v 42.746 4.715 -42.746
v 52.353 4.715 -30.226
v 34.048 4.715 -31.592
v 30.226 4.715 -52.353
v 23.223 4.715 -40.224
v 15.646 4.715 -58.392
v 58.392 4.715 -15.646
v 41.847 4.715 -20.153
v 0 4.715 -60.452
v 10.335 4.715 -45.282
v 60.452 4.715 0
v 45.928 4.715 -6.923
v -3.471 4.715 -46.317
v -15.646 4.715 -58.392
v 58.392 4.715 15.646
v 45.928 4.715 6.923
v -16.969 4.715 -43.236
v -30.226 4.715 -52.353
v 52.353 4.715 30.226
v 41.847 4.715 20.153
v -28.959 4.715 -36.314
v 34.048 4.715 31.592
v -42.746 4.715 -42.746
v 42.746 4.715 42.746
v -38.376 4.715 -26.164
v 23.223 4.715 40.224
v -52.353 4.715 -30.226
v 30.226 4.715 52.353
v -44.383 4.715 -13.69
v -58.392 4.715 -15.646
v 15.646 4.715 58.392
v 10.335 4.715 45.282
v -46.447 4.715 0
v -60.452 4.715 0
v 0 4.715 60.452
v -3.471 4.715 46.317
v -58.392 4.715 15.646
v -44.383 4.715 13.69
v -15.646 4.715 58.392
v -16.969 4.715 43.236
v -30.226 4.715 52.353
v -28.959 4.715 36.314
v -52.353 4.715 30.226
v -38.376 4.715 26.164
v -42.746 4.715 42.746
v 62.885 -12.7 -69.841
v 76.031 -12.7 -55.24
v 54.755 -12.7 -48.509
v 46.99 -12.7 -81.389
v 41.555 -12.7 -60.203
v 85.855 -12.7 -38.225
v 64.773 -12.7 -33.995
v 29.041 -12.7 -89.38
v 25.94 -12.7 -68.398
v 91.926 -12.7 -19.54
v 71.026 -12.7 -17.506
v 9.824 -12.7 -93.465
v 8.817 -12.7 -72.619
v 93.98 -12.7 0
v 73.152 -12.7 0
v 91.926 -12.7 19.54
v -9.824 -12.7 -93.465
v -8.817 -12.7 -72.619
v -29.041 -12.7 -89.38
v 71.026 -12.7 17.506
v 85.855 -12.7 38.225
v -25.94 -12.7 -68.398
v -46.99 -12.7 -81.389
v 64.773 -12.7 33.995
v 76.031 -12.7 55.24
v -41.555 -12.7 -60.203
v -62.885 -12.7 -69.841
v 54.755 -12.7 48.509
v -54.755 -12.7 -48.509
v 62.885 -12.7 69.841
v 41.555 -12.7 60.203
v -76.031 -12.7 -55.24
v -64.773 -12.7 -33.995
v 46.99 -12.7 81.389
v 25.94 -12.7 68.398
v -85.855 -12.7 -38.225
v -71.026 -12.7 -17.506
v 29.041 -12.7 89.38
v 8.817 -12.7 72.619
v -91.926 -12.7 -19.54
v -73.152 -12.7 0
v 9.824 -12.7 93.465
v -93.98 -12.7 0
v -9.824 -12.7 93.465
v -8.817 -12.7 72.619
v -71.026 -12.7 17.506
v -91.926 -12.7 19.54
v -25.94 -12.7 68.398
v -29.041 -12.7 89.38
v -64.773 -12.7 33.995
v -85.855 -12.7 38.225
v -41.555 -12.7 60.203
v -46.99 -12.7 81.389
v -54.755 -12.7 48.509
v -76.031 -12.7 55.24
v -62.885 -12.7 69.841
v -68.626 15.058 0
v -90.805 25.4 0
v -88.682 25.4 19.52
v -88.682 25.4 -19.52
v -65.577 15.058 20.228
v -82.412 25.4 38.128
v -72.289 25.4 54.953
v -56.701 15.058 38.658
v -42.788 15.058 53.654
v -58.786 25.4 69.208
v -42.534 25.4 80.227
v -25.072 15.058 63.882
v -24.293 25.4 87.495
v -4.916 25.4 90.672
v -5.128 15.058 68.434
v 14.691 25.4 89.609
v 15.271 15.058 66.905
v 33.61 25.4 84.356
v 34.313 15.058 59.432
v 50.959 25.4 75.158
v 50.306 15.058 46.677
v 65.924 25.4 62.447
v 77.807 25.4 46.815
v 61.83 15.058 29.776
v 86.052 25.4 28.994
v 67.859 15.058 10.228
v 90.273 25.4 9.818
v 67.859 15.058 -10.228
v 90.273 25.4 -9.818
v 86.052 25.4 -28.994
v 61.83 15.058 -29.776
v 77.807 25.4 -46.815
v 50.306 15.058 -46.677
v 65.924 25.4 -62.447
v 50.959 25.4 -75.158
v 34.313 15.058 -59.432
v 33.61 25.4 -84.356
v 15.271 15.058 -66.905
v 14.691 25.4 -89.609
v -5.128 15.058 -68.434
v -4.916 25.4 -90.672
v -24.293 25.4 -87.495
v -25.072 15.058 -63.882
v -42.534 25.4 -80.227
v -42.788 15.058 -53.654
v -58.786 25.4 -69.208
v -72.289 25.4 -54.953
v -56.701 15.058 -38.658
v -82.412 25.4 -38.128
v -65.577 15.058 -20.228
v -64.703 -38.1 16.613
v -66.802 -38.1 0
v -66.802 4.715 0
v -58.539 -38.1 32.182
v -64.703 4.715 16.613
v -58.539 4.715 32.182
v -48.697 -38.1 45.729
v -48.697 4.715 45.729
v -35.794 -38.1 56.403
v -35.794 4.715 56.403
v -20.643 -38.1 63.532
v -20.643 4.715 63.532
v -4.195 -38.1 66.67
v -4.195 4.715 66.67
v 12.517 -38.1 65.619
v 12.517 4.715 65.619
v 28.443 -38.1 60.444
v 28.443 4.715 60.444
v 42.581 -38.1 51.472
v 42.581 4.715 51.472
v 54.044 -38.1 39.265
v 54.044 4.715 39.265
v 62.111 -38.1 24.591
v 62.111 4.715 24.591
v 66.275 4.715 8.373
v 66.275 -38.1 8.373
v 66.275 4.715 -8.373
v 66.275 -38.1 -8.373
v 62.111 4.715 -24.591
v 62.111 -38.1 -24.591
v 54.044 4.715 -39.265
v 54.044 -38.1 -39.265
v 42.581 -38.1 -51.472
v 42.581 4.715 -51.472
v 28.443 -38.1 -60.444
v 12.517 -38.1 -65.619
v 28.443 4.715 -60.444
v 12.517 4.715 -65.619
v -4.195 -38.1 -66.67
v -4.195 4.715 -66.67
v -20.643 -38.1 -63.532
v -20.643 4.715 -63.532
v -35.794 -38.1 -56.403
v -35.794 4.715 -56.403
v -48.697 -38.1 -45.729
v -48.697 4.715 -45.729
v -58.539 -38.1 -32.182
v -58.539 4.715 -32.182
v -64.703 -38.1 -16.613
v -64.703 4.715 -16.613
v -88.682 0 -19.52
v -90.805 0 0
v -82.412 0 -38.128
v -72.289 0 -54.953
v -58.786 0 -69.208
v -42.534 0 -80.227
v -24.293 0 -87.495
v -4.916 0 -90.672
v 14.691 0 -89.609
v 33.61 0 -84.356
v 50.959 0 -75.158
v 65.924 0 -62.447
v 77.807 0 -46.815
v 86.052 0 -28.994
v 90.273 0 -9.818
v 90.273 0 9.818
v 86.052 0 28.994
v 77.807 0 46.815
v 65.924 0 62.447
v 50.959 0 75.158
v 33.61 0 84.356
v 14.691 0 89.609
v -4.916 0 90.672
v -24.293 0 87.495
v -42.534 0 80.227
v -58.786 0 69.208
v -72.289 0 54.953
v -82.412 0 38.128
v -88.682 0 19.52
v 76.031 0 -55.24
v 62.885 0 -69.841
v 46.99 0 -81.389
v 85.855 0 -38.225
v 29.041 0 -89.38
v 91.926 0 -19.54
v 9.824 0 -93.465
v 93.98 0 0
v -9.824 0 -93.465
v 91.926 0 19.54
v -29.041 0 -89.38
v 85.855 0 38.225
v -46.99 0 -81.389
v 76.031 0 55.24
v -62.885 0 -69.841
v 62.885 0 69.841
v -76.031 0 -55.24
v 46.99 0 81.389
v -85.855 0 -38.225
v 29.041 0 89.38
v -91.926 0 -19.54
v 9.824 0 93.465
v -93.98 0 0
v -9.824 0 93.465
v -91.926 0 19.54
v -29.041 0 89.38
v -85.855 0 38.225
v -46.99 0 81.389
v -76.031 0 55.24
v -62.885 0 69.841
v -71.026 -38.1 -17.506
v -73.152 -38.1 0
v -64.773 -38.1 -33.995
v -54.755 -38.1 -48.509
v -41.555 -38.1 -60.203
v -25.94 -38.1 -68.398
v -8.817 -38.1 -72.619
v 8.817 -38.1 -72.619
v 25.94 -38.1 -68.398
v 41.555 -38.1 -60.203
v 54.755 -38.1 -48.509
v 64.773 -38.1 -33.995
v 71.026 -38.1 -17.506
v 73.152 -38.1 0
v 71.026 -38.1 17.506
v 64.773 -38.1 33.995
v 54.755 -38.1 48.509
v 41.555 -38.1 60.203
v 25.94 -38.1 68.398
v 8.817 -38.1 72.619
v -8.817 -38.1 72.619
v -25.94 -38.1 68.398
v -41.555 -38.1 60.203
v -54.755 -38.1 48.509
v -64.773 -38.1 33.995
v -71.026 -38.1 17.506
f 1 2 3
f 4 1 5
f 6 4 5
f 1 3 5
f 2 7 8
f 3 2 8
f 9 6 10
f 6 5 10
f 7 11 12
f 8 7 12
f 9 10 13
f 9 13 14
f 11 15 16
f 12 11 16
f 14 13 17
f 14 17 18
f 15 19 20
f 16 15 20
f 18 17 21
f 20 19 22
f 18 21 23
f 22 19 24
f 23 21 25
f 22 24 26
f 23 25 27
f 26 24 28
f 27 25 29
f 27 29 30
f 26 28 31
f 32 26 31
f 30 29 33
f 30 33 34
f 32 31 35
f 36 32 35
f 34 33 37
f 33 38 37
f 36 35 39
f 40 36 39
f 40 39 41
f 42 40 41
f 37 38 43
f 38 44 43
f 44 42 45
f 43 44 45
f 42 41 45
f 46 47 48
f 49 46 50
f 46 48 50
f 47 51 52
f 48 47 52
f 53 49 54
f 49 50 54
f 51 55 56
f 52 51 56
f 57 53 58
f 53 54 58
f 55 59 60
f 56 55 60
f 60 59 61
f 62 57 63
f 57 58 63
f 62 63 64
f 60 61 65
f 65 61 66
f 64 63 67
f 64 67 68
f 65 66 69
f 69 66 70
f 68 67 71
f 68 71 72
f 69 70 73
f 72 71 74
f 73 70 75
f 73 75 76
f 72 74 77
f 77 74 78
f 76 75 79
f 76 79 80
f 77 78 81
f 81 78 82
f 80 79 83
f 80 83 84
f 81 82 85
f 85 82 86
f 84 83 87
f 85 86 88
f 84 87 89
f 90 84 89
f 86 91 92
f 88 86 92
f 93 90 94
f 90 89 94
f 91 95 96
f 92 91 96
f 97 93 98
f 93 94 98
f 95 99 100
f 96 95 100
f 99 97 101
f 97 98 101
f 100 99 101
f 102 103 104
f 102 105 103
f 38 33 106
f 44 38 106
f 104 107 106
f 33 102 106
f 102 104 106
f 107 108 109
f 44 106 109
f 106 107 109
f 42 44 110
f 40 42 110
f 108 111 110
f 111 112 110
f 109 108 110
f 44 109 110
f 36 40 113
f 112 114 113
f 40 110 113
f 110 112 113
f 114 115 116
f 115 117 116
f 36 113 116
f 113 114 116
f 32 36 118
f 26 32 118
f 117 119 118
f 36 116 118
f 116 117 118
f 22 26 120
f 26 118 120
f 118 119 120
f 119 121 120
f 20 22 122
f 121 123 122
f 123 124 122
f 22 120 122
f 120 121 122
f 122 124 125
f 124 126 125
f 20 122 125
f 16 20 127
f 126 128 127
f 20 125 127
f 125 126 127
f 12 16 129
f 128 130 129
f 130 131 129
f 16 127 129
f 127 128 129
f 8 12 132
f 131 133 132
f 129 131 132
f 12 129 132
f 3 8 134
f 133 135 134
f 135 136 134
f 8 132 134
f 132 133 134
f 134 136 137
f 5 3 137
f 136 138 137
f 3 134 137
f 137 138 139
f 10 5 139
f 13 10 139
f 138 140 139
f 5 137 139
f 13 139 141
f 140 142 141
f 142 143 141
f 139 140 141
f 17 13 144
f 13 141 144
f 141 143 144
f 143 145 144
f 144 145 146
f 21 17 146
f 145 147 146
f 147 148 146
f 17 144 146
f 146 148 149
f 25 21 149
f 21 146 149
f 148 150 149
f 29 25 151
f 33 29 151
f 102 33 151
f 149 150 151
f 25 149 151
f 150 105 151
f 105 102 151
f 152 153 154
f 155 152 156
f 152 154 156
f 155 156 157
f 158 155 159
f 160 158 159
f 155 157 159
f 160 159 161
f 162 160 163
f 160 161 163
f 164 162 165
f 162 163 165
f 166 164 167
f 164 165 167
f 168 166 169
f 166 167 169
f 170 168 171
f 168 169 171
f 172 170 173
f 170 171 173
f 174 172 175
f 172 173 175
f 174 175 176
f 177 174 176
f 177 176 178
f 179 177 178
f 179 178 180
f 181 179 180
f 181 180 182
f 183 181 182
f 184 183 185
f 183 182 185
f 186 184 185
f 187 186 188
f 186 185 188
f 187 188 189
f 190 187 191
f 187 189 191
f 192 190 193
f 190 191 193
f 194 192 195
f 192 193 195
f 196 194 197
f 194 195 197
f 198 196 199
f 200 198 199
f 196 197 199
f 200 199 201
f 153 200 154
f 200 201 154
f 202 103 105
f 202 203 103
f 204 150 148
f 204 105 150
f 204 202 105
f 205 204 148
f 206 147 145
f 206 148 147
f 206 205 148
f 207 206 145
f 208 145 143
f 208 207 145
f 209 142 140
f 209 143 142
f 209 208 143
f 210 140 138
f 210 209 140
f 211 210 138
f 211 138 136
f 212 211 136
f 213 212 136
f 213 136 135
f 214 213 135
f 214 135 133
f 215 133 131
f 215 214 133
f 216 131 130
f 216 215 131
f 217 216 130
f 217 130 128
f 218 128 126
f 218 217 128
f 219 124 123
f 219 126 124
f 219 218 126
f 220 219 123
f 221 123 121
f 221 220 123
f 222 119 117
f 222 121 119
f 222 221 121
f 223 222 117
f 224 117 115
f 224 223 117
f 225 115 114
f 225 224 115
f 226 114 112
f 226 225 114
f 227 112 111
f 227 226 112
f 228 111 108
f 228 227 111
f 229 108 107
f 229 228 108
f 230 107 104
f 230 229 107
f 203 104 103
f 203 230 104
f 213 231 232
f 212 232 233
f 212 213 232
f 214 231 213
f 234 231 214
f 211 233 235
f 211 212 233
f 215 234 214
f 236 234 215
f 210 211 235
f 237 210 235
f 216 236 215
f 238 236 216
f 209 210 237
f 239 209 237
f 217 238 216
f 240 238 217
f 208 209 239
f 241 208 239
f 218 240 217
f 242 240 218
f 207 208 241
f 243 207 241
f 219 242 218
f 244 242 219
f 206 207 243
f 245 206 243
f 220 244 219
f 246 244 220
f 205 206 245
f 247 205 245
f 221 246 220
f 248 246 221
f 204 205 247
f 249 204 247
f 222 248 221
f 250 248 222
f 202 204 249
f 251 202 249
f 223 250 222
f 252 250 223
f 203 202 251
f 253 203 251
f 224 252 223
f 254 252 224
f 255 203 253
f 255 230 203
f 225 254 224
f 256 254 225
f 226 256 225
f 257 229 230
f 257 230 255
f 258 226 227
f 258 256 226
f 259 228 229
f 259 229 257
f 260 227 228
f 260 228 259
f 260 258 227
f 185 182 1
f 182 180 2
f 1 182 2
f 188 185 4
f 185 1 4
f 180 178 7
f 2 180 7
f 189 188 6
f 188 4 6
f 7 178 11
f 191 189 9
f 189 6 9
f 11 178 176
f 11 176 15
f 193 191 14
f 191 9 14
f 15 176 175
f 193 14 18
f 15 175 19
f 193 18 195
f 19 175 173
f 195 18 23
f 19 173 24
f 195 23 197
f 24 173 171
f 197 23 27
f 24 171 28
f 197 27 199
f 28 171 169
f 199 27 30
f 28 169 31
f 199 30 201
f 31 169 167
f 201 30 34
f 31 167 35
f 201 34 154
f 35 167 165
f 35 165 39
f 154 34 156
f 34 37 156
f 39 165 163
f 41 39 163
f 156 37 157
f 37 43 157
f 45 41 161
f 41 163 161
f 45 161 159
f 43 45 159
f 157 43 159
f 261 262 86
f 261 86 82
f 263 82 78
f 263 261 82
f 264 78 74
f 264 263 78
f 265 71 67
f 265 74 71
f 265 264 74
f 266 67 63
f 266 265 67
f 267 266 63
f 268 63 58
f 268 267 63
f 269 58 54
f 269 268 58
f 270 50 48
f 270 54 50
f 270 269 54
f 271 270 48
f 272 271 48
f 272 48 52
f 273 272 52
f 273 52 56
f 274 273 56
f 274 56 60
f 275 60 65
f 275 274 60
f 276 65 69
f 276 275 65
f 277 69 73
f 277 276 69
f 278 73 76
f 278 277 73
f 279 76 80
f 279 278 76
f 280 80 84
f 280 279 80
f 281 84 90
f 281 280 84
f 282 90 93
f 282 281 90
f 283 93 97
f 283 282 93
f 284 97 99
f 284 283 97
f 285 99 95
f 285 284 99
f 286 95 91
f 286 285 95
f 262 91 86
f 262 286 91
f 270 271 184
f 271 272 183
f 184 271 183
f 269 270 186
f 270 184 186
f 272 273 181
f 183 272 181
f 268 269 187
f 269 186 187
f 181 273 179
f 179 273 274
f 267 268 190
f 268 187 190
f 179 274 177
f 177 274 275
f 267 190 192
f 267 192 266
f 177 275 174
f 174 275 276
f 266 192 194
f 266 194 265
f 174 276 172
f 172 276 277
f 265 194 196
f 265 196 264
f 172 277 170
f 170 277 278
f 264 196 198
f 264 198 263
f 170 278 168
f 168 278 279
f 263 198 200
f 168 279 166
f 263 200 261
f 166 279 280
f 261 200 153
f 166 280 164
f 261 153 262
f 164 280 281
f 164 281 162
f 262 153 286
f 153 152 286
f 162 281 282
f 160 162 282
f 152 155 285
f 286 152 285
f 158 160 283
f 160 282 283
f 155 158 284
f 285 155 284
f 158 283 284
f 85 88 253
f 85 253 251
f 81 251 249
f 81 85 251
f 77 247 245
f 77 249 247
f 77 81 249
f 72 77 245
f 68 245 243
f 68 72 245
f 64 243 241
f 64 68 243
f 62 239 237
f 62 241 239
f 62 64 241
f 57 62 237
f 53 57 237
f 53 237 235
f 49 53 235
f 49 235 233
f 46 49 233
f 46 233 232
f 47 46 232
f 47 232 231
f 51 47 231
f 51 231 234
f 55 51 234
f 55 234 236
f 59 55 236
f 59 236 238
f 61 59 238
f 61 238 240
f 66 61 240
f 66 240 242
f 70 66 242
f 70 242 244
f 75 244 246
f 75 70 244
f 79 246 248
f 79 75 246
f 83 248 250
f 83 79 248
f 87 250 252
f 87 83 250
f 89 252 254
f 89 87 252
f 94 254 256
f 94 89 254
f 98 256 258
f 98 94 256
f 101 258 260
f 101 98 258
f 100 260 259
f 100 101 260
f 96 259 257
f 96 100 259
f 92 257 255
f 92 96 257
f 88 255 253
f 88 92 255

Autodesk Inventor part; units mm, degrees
ref_plane "YZ Plane" through (0, 0, 0) normal (1, 0, 0) x (0, 1, 0)
ref_plane "XZ Plane" through (0, 0, 0) normal (0, 1, 0) x (-1, 0, 0)
ref_plane "XY Plane" through (0, 0, 0) normal (0, 0, 1) x (1, 0, 0)
sketch "Sketch1" plane through (0, 0, 0) normal (0, 0, 1) x (1, 0, 0)
  line L0 (0, 25.4) -> (-28.702, 25.4) construction
  line L1 (0, 25.4) -> (-93.98, 25.4) construction
  line L2 (-93.98, 25.4) -> (-90.805, 25.4) construction
  line L3 (-90.805, 25.4) -> (-84.455, 22.4389) construction
  line L4 (-90.805, 25.4) -> (-90.805, 22.4389) construction
  line L5 (-90.805, 0) -> (-93.98, 0)
  line L6 (-28.702, 59.6457) -> (-28.702, -91.9304) construction
  arc A0 (-28.9184, -9.248) -> (-32.3684, -1.8494) centre (-35.052, -7.6045) ccw
  line L7 (-74.93, -180.9657) -> (-28.702, -8.4405)
  line L8 (-90.805, 25.4) -> (-90.805, 0)
  line L9 (-90.805, 25.4) -> (-32.3684, -1.8494)
  line L10 (-28.702, -7.6045) -> (-60.452, -7.6045) construction
  line L11 (-60.452, 11.2462) -> (-60.452, -126.9331) construction
  line L12 (-60.452, -126.9331) -> (-54.102, -126.9331) construction
  line L13 (-54.102, -126.9331) -> (-54.102, -103.2346) construction
  line L14 (-54.102, -103.2346) -> (-60.452, -103.2346)
  line L15 (-60.452, 11.2462) -> (-60.452, 1.7212) construction
  line L16 (-60.452, 11.2462) -> (-60.452, 4.7154) construction
  line L17 (-60.452, 4.7154) -> (-46.4468, 4.7154)
  line L18 (-60.452, 4.7154) -> (-60.452, -103.2346)
  line L19 (-93.98, 0) -> (-93.98, -12.7) construction
  line L20 (-60.452, -12.7) -> (-73.152, -12.7) construction
  line L21 (-93.98, -12.7) -> (-93.98, -25.4) construction
  line L22 (-93.98, -25.4) -> (-93.98, -88.9) construction
  line L23 (-93.98, -88.9) -> (-81.28, -88.9) construction
  line L24 (-81.28, -88.9) -> (-81.28, -25.4) construction
  line L25 (-93.98, -25.4) -> (-81.28, -25.4)
  line L26 (-81.28, -25.4) -> (-81.28, -88.9)
  line L27 (-81.28, -88.9) -> (-93.98, -88.9)
  line L28 (-93.98, -12.7) -> (-73.152, -12.7)
  line L29 (-73.152, -138.7824) -> (-63.627, -138.7824)
  line L30 (-81.28, -88.9) -> (-81.28, -180.9657)
  line L31 (-81.28, -180.9657) -> (-74.93, -180.9657)
  line L32 (-73.152, -12.7) -> (-73.152, -138.7824)
  line L33 (-87.63, -25.4) -> (-87.63, -31.3436)
  line L34 (-87.63, -31.3436) -> (-93.98, -31.3436)
  line L35 (-93.98, 0) -> (-93.98, -25.4)
  line L36 (-93.98, -31.3436) -> (-93.98, -88.9)
  line L37 (-87.63, -155.5657) -> (-87.63, -216.5135)
  line L38 (-28.9184, -9.248) -> (-84.455, -216.5135)
  line L39 (-84.455, -216.5135) -> (-87.63, -216.5135)
  line L40 (-81.28, -155.5657) -> (-87.63, -155.5657)
  line L41 (-60.452, 4.7154) -> (-60.452, -7.6045)
  line L42 (-66.802, -38.1) -> (-73.152, -38.1)
  line L43 (-66.802, -38.1) -> (-66.802, 4.7154)
  line L44 (-66.802, 4.7154) -> (-60.452, 4.7154)
  line L45 (0, -319.0244) -> (0, 122.7573) projected
  point P0 (0, 0)
  point P1 (-93.98, -255.9127)
  point P2 (-88.7095, 22.4389)
  dimension "d0" = 28.702
  dimension "d1" = 93.98
  dimension "d2" = 3.175
  dimension "d3" = 25
  dimension "d5" = 25.4
  dimension "d6" = 25.4
  dimension "d8" = 12.7
  dimension "d12" = 31.75
  dimension "d13" = 6.35
  dimension "d16" = 12.7
  dimension "d17" = 12.7
  dimension "d18" = 12.7
  dimension "d19" = 63.5
  dimension "d20" = 12.7
  dimension "d22" = 9.525
  dimension "d23" = 6.35
  dimension "d25" = 5.9436
  dimension "d26" = 15
  dimension "d27" = 3.175
  dimension "d28" = 6.35
  dimension "d29" = 25.4
  dimension "d30" = 107.95
  dimension "d31" = 6.35
  dimension "d32" = 25.4
revolve "Revolution1" add sketch "Sketch1" angle 360 about axis through (0, -10, 0) along (0, 1, 0) contours L8 L9 L17 L44 L43 L42 L32 L28 L35 L5
properties part number "Phenolic" material "Phenolic Resin"
